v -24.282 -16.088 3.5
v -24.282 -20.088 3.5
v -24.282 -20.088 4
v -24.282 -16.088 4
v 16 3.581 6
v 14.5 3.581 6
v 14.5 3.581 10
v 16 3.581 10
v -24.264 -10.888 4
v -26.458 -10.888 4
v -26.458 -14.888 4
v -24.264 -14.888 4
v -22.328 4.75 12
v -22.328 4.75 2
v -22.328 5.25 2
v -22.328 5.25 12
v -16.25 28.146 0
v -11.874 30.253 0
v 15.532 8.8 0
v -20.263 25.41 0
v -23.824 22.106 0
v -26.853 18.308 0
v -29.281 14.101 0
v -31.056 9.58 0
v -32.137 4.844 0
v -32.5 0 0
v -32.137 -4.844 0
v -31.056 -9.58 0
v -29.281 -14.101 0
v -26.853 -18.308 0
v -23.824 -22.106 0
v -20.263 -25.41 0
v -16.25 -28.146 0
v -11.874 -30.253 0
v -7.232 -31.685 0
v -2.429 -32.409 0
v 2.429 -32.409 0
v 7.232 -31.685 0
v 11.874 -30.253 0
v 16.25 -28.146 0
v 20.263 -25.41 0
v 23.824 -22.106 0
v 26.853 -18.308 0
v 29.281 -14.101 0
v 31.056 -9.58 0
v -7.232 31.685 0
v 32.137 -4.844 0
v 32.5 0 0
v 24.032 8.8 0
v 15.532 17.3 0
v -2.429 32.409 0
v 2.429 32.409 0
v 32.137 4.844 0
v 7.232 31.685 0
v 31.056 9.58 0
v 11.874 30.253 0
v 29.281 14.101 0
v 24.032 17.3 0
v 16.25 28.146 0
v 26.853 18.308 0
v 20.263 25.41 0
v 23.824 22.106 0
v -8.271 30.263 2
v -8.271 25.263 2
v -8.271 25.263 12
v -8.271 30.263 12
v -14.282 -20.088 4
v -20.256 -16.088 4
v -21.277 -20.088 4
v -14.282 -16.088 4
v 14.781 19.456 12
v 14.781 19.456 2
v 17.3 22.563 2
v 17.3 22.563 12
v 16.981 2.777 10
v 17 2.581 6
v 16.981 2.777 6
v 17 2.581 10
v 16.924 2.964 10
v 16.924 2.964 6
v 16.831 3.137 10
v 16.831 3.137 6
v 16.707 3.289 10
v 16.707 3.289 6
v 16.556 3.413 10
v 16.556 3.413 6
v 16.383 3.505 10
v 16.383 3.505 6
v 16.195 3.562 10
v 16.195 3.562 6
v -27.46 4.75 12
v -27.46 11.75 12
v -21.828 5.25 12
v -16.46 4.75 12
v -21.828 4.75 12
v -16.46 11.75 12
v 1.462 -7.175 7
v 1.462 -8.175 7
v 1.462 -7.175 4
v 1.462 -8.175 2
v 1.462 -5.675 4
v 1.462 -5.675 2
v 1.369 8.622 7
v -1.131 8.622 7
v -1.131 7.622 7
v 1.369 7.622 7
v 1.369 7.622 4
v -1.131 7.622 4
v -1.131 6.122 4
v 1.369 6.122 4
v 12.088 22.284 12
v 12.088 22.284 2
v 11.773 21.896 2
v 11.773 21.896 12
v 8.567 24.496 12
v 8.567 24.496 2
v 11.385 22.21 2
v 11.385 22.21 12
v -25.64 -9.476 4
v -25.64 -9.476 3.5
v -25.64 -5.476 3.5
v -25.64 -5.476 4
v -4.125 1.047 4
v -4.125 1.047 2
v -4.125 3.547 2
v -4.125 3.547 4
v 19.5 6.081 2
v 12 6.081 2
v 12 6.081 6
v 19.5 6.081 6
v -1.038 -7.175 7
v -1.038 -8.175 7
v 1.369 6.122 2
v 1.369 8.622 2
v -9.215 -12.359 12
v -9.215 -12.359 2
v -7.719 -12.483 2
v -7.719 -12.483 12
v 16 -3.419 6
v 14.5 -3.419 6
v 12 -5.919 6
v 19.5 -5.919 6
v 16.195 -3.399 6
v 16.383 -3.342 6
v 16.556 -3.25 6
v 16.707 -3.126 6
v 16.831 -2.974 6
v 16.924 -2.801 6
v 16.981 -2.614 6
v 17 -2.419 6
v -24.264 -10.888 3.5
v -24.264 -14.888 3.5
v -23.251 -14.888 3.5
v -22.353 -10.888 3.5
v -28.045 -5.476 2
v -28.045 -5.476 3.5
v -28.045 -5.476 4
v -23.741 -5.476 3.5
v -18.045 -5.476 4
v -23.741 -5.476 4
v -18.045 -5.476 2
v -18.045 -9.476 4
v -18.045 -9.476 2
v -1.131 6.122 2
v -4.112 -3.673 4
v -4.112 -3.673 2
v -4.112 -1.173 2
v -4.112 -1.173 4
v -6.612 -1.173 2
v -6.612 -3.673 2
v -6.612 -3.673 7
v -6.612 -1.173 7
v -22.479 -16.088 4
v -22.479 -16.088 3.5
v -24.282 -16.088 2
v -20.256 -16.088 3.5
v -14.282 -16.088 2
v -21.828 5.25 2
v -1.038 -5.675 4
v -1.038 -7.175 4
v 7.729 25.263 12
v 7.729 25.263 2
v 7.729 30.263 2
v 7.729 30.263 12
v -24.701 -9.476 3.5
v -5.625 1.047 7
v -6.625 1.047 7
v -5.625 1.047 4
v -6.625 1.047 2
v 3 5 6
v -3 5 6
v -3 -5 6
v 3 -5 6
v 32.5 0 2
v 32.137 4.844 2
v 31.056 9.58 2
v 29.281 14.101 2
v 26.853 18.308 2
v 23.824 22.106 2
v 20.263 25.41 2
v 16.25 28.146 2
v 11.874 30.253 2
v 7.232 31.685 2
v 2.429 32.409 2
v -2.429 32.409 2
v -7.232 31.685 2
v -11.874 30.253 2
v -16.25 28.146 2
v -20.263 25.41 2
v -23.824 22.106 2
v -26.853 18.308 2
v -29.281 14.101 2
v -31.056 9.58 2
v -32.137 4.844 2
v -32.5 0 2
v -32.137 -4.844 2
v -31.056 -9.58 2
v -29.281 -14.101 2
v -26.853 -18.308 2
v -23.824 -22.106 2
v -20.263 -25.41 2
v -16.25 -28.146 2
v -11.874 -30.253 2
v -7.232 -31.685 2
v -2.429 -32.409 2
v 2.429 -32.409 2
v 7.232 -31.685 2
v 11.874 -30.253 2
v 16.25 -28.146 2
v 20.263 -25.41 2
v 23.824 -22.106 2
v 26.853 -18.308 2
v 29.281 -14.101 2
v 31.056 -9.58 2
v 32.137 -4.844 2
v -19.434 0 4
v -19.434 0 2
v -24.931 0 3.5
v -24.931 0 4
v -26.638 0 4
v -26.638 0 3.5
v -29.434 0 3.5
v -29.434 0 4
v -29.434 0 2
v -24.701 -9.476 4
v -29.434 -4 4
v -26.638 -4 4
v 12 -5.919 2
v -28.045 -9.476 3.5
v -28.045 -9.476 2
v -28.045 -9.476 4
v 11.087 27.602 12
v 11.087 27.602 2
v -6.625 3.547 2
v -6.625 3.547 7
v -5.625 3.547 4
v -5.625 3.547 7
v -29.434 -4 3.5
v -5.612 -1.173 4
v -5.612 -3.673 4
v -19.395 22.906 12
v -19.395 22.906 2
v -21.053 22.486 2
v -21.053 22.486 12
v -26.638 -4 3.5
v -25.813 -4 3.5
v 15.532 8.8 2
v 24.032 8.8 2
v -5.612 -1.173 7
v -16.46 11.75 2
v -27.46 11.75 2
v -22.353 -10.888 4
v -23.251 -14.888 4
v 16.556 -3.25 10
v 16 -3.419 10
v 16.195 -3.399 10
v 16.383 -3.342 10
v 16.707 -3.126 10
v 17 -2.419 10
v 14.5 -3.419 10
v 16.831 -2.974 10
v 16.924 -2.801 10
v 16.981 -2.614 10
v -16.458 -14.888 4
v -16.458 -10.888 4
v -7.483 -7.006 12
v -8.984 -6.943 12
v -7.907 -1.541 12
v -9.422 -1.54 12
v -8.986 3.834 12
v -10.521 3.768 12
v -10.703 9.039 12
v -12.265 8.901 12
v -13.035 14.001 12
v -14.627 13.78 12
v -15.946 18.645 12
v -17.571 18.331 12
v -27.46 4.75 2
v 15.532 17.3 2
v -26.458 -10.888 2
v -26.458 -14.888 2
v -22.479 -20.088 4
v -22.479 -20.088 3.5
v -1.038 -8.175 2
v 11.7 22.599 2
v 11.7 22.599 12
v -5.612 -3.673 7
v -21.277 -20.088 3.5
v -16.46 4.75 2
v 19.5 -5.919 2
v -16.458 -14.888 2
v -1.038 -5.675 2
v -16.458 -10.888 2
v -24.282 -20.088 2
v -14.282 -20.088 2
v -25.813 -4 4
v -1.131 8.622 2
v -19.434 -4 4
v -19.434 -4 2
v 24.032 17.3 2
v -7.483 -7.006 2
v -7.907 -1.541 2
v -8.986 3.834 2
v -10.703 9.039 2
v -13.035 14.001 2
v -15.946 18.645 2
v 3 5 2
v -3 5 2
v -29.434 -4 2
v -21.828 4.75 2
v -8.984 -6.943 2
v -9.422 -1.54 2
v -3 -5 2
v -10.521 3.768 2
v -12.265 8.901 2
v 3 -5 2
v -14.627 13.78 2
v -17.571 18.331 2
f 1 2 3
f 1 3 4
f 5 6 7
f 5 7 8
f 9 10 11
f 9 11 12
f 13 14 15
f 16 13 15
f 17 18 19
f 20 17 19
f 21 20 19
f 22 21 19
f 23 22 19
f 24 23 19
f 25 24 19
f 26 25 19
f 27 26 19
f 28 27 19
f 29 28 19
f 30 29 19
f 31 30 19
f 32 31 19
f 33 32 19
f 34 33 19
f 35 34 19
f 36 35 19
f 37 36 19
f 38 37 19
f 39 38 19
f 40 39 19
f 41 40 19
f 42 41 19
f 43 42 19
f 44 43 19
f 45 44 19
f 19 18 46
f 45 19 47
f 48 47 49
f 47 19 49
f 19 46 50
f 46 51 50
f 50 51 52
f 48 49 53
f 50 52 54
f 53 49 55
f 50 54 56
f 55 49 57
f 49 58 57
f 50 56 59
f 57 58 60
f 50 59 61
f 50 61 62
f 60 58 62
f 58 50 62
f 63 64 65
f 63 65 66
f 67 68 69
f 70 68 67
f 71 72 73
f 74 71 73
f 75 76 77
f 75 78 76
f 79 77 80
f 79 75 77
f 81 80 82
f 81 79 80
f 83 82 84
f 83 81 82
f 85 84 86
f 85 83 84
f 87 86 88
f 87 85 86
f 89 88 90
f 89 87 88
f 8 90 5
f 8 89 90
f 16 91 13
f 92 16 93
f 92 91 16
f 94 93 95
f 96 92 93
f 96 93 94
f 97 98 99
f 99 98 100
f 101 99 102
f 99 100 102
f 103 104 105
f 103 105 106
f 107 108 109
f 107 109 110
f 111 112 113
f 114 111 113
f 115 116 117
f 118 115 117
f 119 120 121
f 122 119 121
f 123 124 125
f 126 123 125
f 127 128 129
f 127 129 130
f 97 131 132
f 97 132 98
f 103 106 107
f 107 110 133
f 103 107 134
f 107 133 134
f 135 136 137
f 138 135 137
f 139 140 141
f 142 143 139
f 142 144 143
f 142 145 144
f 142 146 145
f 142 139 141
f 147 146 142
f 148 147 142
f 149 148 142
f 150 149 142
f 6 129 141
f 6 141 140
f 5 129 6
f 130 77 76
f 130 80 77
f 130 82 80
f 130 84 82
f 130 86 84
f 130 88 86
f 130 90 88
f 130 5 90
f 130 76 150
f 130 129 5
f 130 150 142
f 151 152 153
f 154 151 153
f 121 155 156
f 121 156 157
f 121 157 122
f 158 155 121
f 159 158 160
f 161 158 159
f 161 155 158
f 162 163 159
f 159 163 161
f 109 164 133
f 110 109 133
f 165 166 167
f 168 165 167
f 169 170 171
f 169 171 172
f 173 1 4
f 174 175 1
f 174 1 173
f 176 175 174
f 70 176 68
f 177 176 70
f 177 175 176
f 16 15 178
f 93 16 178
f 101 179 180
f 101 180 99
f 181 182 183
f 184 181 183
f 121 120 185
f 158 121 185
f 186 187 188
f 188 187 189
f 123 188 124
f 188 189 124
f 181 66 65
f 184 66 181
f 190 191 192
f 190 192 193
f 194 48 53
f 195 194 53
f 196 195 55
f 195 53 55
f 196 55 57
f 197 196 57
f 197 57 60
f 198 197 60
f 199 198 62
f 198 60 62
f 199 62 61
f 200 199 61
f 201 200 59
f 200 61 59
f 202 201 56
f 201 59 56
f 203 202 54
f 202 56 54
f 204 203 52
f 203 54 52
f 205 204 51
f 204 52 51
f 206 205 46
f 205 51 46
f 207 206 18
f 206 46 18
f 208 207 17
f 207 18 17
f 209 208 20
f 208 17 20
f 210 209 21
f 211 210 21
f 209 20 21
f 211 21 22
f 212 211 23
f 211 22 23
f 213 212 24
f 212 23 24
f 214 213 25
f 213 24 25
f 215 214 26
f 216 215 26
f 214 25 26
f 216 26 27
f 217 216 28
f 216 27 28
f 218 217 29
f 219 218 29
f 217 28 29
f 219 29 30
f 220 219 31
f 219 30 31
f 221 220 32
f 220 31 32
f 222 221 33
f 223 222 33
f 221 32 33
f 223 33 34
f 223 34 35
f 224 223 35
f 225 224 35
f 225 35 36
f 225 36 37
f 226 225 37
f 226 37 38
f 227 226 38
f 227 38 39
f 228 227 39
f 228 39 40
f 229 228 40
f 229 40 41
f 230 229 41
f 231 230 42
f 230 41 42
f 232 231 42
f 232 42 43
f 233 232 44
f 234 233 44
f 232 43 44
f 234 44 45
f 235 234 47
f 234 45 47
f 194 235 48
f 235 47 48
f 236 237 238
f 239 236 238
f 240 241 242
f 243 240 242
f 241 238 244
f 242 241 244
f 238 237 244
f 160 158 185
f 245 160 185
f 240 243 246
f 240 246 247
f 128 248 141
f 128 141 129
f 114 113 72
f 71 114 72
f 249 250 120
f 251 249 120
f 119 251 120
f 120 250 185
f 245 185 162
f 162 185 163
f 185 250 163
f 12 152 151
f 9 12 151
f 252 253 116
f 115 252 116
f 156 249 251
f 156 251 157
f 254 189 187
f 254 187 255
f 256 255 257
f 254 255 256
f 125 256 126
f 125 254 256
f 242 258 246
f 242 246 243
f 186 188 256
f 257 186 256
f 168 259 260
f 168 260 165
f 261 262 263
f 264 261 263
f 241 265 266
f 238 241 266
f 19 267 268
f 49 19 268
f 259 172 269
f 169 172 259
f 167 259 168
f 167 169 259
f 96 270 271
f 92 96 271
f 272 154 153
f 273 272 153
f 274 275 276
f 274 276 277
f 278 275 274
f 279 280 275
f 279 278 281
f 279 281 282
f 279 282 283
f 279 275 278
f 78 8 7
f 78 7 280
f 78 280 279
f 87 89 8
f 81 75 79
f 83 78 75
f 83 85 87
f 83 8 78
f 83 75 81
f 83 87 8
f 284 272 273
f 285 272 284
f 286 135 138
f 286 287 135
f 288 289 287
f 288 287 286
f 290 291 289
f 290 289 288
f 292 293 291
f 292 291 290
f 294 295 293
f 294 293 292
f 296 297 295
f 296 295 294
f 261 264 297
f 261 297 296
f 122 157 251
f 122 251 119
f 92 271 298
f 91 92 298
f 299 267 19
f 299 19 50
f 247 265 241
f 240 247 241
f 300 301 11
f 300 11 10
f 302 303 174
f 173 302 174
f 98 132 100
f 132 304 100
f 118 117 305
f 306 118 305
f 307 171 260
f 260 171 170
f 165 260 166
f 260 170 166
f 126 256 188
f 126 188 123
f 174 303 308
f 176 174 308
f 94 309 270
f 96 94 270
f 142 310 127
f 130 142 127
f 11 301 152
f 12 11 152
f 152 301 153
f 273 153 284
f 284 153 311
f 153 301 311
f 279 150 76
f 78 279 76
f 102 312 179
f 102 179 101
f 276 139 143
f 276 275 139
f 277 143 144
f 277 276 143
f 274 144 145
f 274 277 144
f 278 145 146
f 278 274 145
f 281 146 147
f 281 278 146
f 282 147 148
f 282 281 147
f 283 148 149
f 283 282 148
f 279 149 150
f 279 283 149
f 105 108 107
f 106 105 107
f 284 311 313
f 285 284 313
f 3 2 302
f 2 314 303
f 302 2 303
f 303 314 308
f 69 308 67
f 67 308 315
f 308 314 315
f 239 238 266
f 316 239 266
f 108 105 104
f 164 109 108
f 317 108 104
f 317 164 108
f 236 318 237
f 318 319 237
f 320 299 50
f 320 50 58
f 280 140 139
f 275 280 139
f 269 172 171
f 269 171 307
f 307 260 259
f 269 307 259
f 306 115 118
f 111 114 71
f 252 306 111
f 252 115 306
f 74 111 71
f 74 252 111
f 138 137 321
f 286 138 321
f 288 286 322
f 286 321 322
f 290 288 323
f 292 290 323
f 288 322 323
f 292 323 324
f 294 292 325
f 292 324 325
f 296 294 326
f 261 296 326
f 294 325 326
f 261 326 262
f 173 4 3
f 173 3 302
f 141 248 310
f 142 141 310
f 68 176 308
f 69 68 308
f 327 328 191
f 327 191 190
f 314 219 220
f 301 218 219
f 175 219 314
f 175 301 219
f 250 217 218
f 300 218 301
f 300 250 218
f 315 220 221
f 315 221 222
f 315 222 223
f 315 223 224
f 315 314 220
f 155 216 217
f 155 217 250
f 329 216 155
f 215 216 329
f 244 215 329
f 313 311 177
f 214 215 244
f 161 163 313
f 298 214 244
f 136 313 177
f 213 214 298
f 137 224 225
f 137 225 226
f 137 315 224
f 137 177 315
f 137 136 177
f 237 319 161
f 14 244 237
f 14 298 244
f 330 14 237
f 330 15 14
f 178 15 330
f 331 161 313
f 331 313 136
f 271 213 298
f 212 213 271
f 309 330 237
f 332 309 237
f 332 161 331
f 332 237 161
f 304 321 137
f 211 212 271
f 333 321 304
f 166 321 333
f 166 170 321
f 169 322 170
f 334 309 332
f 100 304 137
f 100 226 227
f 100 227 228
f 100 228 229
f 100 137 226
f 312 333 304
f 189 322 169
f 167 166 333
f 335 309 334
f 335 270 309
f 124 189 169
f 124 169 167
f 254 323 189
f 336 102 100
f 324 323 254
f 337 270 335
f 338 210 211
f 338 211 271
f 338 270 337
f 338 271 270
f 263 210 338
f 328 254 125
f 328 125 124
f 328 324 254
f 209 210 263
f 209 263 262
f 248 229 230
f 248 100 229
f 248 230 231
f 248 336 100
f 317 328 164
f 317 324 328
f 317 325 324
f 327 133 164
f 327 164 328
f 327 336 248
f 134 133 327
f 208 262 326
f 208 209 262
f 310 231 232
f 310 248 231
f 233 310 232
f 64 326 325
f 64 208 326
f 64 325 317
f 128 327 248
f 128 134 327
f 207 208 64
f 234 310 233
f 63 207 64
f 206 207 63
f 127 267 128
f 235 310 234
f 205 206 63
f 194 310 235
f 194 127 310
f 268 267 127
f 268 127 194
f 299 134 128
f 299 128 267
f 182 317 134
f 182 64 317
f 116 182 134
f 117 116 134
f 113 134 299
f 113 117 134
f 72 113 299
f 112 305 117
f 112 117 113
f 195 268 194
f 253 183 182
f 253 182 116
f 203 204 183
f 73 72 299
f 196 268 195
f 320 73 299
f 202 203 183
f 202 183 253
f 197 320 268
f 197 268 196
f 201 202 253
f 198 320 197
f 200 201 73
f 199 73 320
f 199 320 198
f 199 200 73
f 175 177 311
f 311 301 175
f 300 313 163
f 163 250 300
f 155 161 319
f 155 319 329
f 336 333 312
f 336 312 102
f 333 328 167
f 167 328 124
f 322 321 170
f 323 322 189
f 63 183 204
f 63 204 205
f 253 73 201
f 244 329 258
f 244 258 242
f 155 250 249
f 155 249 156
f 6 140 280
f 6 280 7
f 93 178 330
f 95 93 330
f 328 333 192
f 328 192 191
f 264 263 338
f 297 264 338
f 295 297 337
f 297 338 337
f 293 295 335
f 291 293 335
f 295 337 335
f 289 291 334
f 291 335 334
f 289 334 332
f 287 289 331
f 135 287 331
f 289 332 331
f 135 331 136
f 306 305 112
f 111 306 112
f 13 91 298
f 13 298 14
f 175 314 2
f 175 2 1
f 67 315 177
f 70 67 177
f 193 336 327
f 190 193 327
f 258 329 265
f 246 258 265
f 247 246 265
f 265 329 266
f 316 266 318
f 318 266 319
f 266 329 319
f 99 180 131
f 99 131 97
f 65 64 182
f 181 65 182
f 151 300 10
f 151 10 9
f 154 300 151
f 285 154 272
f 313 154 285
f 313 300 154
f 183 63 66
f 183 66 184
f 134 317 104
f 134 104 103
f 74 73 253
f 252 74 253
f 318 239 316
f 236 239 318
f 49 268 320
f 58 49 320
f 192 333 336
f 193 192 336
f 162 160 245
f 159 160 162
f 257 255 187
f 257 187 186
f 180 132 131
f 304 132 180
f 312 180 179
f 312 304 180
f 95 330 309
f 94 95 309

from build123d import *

# Parameters (mm, degrees)
F0_R      = 32.5
F1_DEPTH  = 2
F2_W      = 16
F2_H      = 5
F3_DEPTH  = 10
F4_W      = 6
F4_H      = 10
F4_W_2    = 7.5
F4_H_2    = 12
F5_DEPTH  = 4
F6_W      = 2.5
F6_H      = 7
F7_DEPTH  = 4
F8_R      = 1
F9_W      = 2.5
F9_H      = 2.5
F10_DEPTH = 2
F11_W     = 2.5
F11_H     = 1
F11_W_2   = 1
F11_H_2   = 2.5
F12_DEPTH = 3
F13_W     = 8.5
F13_H     = 8.5
F14_DEPTH = 25
F15_W     = 10
F15_H     = 4
F16_DEPTH = 1.5
F17_W     = 2.795801
F17_H     = 4
F17_W_2   = 2.404703
F17_W_3   = 2.193978
F17_W_4   = 1.803281
F18_DEPTH = 0.5


with BuildPart() as f1:
    # F0 (on Top) → F1 (new body)
    with BuildSketch(Plane.XY):
        Circle(F0_R)
    extrude(amount=F1_DEPTH)

    # F2 (on face) → F3 (join)
    with BuildSketch(Plane.XY.offset(2)):
        with Locations((-0.270834, 27.762719)):
            Rectangle(F2_W, F2_H)
        Polygon((17.300418, 22.562942), (11.08706, 27.602206), (8.567428, 24.495527), (11.384874, 22.210474), (11.699828, 22.598809), (12.088162, 22.283855), (11.773208, 21.89552), (14.780786, 19.456263), align=None)
        Polygon((-16.460359, 11.750014), (-27.460359, 11.750014), (-27.460359, 4.750014), (-22.328375, 4.750014), (-22.328375, 5.250014), (-21.828375, 5.250014), (-21.828375, 4.750014), (-16.460359, 4.750014), align=None)
        with BuildLine():
            Line((-9.214541, -12.358905), (-7.719307, -12.482575))
            ThreePointArc((-7.719307, -12.482575), (-9.766223, 6.462552), (-19.395168, 22.906126))
            Line((-19.395168, 22.906126), (-21.053303, 22.485526))
            ThreePointArc((-21.053303, 22.485526), (-11.314103, 6.361134), (-9.214541, -12.358905))
        make_face()
    extrude(amount=F3_DEPTH)

    # F4 (on face) → F5 (join)
    with BuildSketch(Plane.XY.offset(2)):
        Rectangle(F4_W, F4_H)
        with Locations((15.75, 0.081453)):
            Rectangle(F4_W_2, F4_H_2)
    extrude(amount=F5_DEPTH)

    # F6 (on face) → F7 (join)
    with BuildSketch(Plane.XY.offset(6)):
        with Locations((15.75, 0.081453)):
            Rectangle(F6_W, F6_H)
    extrude(amount=F7_DEPTH)

    # F8
    f8_edges = [f1.edges().sort_by_distance(p)[0] for p in [
        (17, -3.418547, 8),
        (17, 3.581453, 8),
    ]]
    fillet(f8_edges, radius=F8_R)

    # F9 (on face) → F10 (join)
    with BuildSketch(Plane.XY.offset(2)):
        with Locations((-5.362472, -2.423183)):
            Rectangle(F9_W, F9_H)
        with Locations((-5.374835, 2.296795)):
            Rectangle(F9_W, F9_H)
        with Locations((0.118701, 7.372063)):
            Rectangle(F9_W, F9_H)
        with Locations((0.21179, -6.925349)):
            Rectangle(F9_W, F9_H)
    extrude(amount=F10_DEPTH)

    # F11 (on face) → F12 (join)
    with BuildSketch(Plane.XY.offset(4)):
        with Locations((0.21179, -7.675349)):
            Rectangle(F11_W, F11_H)
        with Locations((-6.124835, 2.296795)):
            Rectangle(F11_W_2, F11_H_2)
        with Locations((-6.112472, -2.423183)):
            Rectangle(F11_W_2, F11_H_2)
        with Locations((0.118701, 8.122063)):
            Rectangle(F11_W, F11_H)
    extrude(amount=F12_DEPTH)

    # F13 (on face) → F14 (cut)
    with BuildSketch(Plane.XY.offset(2)):
        with Locations((19.782292, 13.050183)):
            Rectangle(F13_W, F13_H)
    extrude(amount=-F14_DEPTH, mode=Mode.SUBTRACT)

    # F15 (on face) → F16 (join)
    with BuildSketch(Plane.XY.offset(2)):
        with Locations((-24.43407, -2)):
            Rectangle(F15_W, F15_H)
        with Locations((-23.044675, -7.475554)):
            Rectangle(F15_W, F15_H)
        with Locations((-21.457909, -12.888055)):
            Rectangle(F15_W, F15_H)
        with Locations((-19.281841, -18.088401)):
            Rectangle(F15_W, F15_H)
    extrude(amount=F16_DEPTH)

    # F17 (on face) → F18 (join)
    with BuildSketch(Plane.XY.offset(3.5)):
        with Locations((-28.036169, -2)):
            Rectangle(F17_W, F17_H)
        Polygon((-24.931015, 0), (-25.812697, -4), (-19.43407, -4), (-19.43407, 0), align=None)
        with Locations((-26.842323, -7.475554)):
            Rectangle(F17_W_2, F17_H)
        Polygon((-23.740886, -5.475554), (-24.701254, -9.475554), (-18.044675, -9.475554), (-18.044675, -5.475554), align=None)
        with Locations((-25.36092, -12.888055)):
            Rectangle(F17_W_3, F17_H)
        Polygon((-22.352759, -10.888055), (-23.25128, -14.888055), (-16.457909, -14.888055), (-16.457909, -10.888055), align=None)
        with Locations((-23.380201, -18.088401)):
            Rectangle(F17_W_4, F17_H)
        Polygon((-14.281841, -16.088401), (-20.255804, -16.088401), (-21.277487, -20.088401), (-14.281841, -20.088401), align=None)
    extrude(amount=F18_DEPTH)


solid = f1.part
